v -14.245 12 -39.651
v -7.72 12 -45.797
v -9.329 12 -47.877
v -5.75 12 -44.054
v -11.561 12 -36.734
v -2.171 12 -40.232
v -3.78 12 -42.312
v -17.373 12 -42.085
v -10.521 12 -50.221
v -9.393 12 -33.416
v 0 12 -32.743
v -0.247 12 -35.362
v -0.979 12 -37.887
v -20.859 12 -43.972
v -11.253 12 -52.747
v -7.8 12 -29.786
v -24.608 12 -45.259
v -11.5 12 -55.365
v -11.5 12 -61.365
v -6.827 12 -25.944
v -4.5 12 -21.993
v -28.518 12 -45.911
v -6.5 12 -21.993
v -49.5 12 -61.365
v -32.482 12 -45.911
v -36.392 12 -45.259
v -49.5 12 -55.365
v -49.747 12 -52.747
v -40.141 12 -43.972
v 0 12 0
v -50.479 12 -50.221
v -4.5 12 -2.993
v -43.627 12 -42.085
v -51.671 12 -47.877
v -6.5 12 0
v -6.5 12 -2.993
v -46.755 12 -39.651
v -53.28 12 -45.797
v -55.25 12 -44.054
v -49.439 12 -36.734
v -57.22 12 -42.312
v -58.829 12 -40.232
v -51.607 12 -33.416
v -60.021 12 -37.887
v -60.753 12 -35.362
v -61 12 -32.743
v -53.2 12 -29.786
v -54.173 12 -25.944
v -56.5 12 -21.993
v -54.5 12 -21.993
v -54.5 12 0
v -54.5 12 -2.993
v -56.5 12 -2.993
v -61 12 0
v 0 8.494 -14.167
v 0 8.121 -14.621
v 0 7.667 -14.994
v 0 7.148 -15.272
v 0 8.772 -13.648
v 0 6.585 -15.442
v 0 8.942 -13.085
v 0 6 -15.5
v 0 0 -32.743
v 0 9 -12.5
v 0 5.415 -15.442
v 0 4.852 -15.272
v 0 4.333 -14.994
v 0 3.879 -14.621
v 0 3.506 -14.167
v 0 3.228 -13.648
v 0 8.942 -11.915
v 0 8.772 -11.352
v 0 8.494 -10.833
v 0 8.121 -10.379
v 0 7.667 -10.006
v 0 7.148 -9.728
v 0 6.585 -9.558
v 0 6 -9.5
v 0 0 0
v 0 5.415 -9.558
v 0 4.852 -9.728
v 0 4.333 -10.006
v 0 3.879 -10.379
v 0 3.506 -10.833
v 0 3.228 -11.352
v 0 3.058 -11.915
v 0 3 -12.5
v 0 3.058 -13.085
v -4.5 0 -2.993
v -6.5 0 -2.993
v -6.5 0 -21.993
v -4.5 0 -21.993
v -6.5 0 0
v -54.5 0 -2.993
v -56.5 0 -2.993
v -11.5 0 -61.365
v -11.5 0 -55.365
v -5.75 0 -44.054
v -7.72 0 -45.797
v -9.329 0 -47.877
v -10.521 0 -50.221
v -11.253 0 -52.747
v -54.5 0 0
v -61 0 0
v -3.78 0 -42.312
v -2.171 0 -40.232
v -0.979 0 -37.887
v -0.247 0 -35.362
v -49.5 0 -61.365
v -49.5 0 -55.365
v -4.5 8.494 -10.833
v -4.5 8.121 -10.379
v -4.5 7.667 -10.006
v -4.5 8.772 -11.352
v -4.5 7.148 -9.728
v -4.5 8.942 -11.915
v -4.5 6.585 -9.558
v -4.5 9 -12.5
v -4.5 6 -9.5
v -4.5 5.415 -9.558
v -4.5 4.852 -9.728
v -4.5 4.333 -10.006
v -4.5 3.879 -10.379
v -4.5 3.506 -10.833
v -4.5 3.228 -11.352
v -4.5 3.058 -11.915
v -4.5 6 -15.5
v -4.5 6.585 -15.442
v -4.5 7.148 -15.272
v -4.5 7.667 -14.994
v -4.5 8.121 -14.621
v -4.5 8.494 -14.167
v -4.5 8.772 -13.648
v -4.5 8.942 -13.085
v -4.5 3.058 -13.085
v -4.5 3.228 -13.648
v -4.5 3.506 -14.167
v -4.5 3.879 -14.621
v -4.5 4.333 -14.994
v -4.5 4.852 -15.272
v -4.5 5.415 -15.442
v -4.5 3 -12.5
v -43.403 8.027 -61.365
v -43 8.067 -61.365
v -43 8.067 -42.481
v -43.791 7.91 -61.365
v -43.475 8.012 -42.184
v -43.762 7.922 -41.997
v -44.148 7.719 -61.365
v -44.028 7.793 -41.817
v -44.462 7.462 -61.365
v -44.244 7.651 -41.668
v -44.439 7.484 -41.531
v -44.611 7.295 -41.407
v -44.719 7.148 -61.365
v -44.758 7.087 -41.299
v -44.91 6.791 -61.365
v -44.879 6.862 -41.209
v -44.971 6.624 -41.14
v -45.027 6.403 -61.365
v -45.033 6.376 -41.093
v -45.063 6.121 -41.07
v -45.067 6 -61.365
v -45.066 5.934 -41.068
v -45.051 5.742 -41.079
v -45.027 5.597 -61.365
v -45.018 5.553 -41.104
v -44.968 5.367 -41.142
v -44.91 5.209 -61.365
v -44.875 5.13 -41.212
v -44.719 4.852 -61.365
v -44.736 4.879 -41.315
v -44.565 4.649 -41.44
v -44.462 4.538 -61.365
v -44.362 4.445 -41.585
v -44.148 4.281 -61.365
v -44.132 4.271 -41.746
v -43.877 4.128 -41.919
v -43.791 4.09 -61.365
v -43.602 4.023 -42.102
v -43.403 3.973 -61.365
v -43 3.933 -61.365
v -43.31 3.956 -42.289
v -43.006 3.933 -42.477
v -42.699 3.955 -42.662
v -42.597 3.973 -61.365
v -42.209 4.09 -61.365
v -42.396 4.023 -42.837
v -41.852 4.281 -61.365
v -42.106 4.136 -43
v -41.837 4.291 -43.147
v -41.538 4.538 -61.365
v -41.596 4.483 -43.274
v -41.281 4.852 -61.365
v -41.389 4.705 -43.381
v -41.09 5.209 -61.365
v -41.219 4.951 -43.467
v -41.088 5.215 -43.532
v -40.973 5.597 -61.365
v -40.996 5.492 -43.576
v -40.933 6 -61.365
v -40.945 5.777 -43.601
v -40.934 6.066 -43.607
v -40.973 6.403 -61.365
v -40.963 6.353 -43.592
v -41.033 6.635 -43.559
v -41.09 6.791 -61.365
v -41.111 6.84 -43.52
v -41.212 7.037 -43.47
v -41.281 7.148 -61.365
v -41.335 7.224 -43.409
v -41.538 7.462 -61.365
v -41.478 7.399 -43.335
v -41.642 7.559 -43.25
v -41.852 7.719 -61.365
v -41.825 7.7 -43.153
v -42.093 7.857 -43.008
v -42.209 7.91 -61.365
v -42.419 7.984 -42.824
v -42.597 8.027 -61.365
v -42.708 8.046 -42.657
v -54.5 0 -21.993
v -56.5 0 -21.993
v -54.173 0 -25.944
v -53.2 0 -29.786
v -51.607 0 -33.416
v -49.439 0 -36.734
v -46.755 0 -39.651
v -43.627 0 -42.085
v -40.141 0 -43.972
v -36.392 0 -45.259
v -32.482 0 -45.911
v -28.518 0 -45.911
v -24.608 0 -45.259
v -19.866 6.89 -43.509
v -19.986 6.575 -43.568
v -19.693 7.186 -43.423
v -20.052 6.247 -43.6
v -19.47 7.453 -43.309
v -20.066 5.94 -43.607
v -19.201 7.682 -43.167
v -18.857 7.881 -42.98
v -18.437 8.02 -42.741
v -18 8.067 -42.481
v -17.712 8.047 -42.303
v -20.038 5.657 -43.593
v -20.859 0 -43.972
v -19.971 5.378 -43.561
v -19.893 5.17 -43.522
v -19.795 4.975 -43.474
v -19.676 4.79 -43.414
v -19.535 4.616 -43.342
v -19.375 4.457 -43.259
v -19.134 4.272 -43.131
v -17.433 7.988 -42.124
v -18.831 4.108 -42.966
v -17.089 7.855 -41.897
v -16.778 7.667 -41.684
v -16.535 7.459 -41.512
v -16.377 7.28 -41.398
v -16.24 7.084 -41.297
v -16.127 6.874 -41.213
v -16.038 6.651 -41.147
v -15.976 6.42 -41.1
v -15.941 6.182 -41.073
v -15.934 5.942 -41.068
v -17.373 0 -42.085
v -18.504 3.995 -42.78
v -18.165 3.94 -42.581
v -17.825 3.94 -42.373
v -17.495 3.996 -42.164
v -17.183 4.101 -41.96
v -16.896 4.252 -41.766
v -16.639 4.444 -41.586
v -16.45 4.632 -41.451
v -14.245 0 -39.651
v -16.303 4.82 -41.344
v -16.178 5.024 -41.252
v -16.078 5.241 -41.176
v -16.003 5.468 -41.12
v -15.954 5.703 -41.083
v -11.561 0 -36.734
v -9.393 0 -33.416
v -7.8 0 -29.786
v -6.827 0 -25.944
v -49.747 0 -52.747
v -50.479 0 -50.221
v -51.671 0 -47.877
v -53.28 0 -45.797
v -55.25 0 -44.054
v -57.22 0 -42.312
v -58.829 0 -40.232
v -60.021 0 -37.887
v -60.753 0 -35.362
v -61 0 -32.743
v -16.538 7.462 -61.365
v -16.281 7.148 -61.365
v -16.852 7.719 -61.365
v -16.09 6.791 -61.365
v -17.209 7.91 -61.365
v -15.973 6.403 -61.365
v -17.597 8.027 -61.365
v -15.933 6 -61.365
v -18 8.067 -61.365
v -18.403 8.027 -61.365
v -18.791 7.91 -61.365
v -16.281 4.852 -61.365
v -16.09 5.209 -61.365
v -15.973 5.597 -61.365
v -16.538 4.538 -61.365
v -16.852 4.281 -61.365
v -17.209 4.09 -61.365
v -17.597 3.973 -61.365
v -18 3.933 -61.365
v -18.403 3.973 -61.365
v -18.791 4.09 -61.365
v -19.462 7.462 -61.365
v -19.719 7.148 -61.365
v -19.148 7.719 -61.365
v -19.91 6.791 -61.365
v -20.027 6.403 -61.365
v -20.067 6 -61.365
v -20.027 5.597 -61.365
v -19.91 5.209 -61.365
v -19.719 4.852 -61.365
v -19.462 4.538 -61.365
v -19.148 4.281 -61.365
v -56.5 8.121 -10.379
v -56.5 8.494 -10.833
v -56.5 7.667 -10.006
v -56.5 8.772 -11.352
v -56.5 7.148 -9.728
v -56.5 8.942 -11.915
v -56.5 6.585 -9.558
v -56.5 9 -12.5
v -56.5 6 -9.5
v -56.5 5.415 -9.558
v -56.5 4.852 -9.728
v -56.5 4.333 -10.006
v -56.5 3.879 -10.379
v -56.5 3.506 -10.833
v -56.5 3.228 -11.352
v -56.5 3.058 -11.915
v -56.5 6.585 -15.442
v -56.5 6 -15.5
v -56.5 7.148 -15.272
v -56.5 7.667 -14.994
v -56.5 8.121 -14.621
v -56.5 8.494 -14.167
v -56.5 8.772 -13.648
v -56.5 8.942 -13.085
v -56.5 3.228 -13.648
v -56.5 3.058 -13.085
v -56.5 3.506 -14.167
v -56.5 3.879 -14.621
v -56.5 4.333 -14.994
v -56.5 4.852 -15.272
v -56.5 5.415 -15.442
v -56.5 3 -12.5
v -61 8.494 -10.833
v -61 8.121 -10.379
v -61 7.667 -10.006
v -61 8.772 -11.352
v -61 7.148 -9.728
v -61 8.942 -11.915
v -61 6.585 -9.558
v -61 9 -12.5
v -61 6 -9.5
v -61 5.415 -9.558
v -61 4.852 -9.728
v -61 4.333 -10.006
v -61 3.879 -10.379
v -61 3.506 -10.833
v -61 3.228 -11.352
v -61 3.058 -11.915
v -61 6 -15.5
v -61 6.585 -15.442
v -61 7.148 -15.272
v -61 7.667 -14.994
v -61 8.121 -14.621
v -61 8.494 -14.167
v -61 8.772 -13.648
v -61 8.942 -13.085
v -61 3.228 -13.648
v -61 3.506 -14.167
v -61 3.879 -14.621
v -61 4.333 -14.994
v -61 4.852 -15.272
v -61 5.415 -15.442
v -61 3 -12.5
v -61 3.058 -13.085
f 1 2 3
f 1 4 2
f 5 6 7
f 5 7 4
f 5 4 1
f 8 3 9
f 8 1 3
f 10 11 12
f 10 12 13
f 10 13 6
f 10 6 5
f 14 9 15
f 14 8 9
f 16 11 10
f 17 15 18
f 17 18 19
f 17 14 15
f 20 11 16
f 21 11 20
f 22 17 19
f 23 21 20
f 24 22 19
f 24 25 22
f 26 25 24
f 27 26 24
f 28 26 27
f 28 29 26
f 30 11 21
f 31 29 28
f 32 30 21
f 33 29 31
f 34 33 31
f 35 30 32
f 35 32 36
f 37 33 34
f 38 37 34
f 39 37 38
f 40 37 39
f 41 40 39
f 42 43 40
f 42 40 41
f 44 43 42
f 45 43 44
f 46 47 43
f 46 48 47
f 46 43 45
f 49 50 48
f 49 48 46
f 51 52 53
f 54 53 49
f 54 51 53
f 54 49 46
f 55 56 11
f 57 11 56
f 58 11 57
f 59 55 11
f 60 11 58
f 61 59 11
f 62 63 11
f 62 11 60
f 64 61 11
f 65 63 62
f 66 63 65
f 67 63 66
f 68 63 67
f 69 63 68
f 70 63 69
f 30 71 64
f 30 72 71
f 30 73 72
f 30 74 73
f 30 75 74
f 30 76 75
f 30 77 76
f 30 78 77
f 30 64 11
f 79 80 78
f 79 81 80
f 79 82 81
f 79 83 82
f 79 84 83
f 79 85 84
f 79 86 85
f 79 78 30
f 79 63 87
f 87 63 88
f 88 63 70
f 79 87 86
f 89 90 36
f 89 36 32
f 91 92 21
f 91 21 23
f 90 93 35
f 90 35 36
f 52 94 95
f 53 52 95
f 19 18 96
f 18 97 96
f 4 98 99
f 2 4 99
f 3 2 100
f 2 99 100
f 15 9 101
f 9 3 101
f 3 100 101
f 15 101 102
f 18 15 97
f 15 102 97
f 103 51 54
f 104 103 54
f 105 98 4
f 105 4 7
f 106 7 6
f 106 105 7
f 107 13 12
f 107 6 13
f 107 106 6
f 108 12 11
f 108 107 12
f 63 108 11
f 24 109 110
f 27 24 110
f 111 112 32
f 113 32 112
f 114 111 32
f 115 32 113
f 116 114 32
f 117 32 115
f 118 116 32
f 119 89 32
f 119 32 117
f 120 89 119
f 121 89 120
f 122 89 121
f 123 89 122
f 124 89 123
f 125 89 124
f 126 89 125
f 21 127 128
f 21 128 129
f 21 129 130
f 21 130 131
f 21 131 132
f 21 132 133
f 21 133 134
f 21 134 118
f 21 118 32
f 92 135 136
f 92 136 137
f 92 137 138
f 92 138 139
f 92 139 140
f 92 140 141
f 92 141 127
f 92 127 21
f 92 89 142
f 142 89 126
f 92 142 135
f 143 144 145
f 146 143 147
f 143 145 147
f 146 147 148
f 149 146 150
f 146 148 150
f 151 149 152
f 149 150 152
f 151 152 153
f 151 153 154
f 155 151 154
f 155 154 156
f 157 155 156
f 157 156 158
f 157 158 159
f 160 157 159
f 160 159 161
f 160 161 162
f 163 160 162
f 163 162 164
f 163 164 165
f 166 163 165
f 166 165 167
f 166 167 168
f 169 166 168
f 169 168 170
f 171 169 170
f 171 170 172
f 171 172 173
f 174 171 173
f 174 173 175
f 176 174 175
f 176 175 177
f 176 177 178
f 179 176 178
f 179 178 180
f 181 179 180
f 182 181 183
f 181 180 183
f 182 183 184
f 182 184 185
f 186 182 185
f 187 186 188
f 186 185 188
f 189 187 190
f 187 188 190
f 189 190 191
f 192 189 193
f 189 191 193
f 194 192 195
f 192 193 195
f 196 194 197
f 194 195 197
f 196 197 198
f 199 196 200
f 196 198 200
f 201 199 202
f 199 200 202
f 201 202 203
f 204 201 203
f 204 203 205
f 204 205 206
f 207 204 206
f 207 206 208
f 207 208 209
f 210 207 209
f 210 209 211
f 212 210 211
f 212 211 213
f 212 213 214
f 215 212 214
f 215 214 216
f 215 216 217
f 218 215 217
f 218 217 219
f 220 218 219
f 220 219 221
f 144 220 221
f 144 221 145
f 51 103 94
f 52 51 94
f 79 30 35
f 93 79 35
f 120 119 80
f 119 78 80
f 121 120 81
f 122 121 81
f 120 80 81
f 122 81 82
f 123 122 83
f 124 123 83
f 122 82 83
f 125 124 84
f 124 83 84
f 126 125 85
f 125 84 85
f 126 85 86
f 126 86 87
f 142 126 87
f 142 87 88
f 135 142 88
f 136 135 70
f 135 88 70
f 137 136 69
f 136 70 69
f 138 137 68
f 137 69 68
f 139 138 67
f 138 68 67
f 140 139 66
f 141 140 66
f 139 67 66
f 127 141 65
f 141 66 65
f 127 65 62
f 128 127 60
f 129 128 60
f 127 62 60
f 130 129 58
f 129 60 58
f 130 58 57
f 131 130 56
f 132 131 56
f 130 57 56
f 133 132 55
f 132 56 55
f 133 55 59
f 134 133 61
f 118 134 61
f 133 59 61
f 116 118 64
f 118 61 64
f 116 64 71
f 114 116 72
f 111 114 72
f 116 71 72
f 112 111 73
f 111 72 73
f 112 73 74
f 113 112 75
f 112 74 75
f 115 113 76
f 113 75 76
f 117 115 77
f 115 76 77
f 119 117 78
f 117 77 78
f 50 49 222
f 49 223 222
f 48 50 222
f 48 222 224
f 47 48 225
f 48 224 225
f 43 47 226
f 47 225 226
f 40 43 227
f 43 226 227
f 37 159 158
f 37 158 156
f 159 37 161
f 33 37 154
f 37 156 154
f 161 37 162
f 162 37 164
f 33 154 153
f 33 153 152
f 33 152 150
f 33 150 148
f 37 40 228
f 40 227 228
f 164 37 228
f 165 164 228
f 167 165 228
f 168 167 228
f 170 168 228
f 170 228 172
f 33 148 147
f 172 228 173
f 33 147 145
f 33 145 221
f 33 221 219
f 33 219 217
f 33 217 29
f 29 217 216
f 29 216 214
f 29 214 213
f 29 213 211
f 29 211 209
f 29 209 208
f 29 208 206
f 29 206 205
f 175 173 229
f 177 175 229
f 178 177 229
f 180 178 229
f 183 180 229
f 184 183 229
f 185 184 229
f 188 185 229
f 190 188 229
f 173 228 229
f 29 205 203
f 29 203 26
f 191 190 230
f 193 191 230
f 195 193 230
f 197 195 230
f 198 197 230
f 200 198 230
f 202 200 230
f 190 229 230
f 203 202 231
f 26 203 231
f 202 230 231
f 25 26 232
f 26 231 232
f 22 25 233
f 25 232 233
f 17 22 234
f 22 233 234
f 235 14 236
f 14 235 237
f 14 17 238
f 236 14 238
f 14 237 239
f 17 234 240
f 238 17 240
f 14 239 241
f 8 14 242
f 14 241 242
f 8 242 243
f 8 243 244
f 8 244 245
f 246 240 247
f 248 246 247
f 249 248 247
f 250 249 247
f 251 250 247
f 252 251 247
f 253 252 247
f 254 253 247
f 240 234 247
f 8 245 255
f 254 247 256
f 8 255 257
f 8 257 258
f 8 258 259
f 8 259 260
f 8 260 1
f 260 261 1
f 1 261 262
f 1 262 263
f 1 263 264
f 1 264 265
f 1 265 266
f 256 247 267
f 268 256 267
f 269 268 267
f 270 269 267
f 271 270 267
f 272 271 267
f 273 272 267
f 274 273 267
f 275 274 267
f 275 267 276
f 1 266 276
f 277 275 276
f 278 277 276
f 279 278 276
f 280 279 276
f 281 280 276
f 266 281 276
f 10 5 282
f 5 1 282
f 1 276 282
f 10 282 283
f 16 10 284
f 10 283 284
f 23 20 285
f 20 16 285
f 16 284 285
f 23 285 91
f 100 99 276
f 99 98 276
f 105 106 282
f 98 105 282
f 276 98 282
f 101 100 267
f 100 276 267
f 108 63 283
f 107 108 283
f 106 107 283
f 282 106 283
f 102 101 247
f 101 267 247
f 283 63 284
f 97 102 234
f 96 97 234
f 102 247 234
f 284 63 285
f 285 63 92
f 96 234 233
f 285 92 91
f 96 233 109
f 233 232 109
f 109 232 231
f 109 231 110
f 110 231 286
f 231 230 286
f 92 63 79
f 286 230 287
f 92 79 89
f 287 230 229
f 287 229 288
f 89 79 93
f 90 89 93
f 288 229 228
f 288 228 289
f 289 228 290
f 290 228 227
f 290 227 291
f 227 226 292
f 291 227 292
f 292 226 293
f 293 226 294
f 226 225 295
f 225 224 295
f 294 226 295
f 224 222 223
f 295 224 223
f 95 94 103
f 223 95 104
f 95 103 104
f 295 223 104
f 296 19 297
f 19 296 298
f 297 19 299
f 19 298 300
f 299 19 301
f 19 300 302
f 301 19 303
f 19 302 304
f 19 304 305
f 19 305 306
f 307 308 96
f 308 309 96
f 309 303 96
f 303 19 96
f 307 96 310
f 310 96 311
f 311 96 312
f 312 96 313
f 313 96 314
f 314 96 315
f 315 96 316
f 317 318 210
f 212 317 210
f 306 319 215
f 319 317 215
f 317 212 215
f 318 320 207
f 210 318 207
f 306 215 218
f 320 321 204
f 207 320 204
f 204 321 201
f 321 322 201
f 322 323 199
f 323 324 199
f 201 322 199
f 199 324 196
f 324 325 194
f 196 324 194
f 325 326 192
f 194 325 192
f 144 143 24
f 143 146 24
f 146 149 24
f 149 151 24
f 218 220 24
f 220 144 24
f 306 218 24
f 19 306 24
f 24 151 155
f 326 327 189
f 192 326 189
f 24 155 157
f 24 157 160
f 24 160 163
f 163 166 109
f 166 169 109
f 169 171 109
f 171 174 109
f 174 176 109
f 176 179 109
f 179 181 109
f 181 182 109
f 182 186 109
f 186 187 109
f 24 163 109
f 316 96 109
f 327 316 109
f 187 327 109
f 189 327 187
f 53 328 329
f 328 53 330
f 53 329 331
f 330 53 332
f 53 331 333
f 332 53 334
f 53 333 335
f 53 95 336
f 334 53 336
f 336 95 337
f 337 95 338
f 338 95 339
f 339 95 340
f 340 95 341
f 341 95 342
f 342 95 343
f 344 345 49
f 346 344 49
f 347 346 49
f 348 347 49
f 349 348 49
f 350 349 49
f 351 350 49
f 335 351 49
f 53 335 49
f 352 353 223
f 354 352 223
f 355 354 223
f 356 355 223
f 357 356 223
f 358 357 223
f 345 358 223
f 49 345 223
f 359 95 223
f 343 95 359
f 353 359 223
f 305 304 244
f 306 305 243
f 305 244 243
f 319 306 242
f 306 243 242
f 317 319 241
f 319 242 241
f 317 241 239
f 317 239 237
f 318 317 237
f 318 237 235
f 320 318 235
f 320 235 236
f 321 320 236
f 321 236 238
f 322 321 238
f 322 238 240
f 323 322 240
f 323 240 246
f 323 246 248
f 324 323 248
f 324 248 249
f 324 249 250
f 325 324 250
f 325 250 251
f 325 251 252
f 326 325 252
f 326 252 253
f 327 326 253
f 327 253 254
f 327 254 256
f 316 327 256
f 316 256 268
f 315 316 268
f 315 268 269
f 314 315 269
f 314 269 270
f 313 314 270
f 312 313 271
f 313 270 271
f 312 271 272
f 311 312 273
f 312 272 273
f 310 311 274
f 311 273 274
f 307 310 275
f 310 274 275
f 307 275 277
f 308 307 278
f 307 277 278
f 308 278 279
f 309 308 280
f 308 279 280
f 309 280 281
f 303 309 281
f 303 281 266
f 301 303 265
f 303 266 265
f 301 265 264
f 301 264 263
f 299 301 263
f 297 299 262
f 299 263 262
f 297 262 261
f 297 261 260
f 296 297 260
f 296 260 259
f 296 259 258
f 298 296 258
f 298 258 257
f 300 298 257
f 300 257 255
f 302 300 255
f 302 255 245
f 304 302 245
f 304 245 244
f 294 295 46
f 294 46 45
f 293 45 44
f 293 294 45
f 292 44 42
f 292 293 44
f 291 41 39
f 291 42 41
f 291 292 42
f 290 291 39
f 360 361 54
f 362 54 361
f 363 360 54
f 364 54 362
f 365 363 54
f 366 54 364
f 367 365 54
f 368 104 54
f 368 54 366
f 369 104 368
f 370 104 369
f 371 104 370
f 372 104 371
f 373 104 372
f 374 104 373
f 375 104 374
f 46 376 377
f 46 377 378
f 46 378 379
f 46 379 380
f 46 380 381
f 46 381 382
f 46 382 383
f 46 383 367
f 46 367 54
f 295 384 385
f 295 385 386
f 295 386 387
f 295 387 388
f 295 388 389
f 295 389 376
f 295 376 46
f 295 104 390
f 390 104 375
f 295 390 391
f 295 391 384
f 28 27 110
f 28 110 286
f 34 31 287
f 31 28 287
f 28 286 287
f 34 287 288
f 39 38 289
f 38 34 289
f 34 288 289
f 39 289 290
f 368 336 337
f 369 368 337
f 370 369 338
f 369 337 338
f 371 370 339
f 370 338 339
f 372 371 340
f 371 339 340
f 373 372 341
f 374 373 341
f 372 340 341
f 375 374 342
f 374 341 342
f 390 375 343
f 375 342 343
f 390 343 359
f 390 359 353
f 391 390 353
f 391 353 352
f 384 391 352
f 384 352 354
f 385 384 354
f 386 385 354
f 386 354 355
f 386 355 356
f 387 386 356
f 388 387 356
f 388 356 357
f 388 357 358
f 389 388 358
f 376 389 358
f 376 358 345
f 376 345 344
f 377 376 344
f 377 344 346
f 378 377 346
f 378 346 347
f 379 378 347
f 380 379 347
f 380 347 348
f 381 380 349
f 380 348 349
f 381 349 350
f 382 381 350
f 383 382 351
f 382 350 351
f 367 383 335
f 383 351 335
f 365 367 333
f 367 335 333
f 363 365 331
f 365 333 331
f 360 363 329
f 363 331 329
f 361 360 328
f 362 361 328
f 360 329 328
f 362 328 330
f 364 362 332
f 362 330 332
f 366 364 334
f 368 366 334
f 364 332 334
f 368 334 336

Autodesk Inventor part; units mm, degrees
ref_plane "YZ Plane" through (0, 0, 0) normal (1, 0, 0) x (0, 1, 0)
ref_plane "XZ Plane" through (0, 0, 0) normal (0, 1, 0) x (-1, 0, 0)
ref_plane "XY Plane" through (0, 0, 0) normal (0, 0, 1) x (1, 0, 0)
sketch "Skizze1" plane through (0, 0, 0) normal (0, 1, 0) x (-1, 0, 0)
  line L0 (54.5, 0) -> (61, 0)
  line L1 (61, 0) -> (61, -32.7433)
  arc A0 (55.25, -44.0542) -> (61, -32.7433) centre (47, -32.7433) ccw
  arc A1 (55.25, -44.0542) -> (49.5, -55.3652) centre (63.5, -55.3652) ccw
  line L2 (54.5, 0) -> (54.5, -2.9933)
  line L3 (54.5, -2.9933) -> (56.5, -2.9933)
  line L4 (56.5, -2.9933) -> (56.5, -21.9933)
  line L5 (56.5, -21.9933) -> (54.5, -21.9933)
  arc A2 (6.5, -21.9933) -> (54.5, -21.9933) centre (30.5, -21.9933) ccw
  arc A3 (11.5, -55.3652) -> (5.75, -44.0542) centre (-2.5, -55.3652) ccw
  arc A4 (0, -32.7433) -> (5.75, -44.0542) centre (14, -32.7433) ccw
  line L6 (0, -32.7433) -> (0, 0)
  line L7 (0, 0) -> (6.5, 0)
  line L8 (6.5, 0) -> (6.5, -2.9933)
  line L9 (6.5, -2.9933) -> (4.5, -2.9933)
  line L10 (4.5, -2.9933) -> (4.5, -21.9933)
  line L11 (4.5, -21.9933) -> (6.5, -21.9933)
  line L12 (11.5, -55.3652) -> (11.5, -61.3652)
  line L13 (11.5, -61.3652) -> (49.5, -61.3652)
  line L14 (49.5, -61.3652) -> (49.5, -55.3652)
  line L15 (49.5, -55.3652) -> (49.5, -61.3652)
  line L16 (30.5, -51.8632) -> (30.5, -31.0026) construction
  point P0 (54.5, -1.4967)
  point P1 (6.5, -1.4967)
  point P2 (30.5, -21.9933)
  point P3 (30.5, -61.3652)
  point P4 (56.5, -12.4933)
  dimension "d2" = 2
  dimension "d3" = 19
  dimension "d4" = 14
  dimension "d5" = 14
  dimension "d6" = 38
  dimension "d10" = 19
  dimension "d12" = 2
  dimension "d13" = 24
  dimension "d14" = 24
  dimension "d18" = 4.5
  dimension "d19" = 4.5
  dimension "d20" = 24
  dimension "d54" = 19
  dimension "d55" = 6
  dimension "d56" = 14
  dimension "d57" = 14
  dimension "d58" = 42.8719
  dimension "d59" = 10.75
extrude "Extrusion1" add sketch "Skizze1" along normal blind 12
sketch "Skizze2" plane through (-11.5, 0, -61.3652) normal (0, 0, -1) x (-1, 0, 0)
  line L0 (0, 0) -> (0, 12) projected
  line L1 (0, 0) -> (38, 0) projected
  point P0 (-11.5, 0)
  point P1 (6.5, 6)
  point P2 (31.5, 6)
  point P3 (0, 6)
  point P4 (19, 0)
  dimension "d35" = 25
  dimension "d36" = 12.5
hole "Bohrung1" at (-18, 6, -61.3652) at (-43, 6, -61.3652) direction (0, 0, 1) diameter 4.134 end through all thread size "M5x0.8" class "6H" standard "ISO Metric profile"
sketch "Skizze3" plane through (0, 0, 0) normal (1, 0, 0) x (0, 0, -1)
  line L0 (0, 0) -> (0, 12) projected
  point P0 (12.5, 6)
  point P1 (0, 6)
  dimension "d44" = 12.5
hole "Bohrung2" at (0, 6, -12.5) direction (1, 0, 0) diameter 6 depth 4.5
sketch "Skizze4" plane through (-61, 0, -32.7433) normal (-1, 0, 0) x (0, 0, 1)
  line L0 (32.7433, 0) -> (32.7433, 12) projected
  point P0 (20.2433, 6)
  point P1 (32.7433, 6)
  dimension "d53" = 12.5
hole "Bohrung3" at (-61, 6, -12.5) direction (1, 0, 0) diameter 6 end through all
equation "\"d10\" = d3"
equation "\"d19\" = d18"
properties part number "102"
